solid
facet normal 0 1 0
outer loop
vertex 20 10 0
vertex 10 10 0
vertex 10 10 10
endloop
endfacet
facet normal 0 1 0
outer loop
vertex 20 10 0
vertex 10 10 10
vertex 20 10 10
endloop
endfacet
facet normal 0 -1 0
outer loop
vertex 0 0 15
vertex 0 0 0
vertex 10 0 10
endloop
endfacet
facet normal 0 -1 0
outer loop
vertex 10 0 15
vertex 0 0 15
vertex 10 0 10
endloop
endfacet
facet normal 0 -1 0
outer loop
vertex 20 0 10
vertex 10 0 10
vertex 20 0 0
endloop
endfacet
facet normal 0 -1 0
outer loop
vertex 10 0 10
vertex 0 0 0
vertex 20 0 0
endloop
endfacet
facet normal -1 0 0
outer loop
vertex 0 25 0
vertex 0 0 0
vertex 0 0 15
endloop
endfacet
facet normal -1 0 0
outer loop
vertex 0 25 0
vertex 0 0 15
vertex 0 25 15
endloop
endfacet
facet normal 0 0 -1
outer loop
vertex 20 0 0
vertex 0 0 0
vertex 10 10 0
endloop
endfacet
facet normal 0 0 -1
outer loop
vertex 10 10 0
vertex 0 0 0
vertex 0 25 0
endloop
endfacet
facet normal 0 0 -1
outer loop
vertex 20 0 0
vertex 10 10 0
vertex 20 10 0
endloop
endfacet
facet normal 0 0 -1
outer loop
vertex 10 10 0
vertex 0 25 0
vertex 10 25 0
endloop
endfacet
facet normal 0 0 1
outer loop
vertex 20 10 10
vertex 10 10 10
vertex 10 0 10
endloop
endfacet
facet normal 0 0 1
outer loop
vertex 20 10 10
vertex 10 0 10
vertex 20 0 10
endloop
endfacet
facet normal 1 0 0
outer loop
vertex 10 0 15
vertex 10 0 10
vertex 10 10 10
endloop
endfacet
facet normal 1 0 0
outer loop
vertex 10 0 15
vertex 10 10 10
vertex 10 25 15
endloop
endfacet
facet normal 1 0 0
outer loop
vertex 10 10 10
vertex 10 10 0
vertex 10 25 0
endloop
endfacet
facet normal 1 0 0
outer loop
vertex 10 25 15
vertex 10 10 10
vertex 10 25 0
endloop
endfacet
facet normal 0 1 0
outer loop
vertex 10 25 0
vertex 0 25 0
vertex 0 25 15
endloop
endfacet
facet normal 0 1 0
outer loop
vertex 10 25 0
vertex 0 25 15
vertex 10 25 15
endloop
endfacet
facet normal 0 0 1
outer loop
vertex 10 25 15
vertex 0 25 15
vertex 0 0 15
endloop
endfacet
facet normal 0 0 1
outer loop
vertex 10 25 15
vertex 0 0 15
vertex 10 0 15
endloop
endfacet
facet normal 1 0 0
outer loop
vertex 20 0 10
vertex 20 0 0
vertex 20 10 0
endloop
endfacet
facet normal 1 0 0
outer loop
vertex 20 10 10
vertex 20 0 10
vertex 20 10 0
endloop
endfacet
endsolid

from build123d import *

# Parameters (mm, degrees)
BOX001_W     = 10
BOX001_H     = 10
BOX001_DEPTH = 10
BOX_W        = 10
BOX_H        = 25
BOX_DEPTH    = 15


with BuildPart() as box001:
    # Box001 → Box001 (new body)
    with BuildSketch(Plane(origin=(10, 0, 0), x_dir=(1, 0, 0), z_dir=(0, 0, 1))):
        with Locations((5, 5)):
            Rectangle(BOX001_W, BOX001_H)
    extrude(amount=BOX001_DEPTH)


with BuildPart() as fusion001:
    # Box → Box (new body)
    with BuildSketch(Plane.XY):
        with Locations((5, 12.5)):
            Rectangle(BOX_W, BOX_H)
    extrude(amount=BOX_DEPTH)

    # Fusion: union Box001
    add(box001.part)


solid = fusion001.part
